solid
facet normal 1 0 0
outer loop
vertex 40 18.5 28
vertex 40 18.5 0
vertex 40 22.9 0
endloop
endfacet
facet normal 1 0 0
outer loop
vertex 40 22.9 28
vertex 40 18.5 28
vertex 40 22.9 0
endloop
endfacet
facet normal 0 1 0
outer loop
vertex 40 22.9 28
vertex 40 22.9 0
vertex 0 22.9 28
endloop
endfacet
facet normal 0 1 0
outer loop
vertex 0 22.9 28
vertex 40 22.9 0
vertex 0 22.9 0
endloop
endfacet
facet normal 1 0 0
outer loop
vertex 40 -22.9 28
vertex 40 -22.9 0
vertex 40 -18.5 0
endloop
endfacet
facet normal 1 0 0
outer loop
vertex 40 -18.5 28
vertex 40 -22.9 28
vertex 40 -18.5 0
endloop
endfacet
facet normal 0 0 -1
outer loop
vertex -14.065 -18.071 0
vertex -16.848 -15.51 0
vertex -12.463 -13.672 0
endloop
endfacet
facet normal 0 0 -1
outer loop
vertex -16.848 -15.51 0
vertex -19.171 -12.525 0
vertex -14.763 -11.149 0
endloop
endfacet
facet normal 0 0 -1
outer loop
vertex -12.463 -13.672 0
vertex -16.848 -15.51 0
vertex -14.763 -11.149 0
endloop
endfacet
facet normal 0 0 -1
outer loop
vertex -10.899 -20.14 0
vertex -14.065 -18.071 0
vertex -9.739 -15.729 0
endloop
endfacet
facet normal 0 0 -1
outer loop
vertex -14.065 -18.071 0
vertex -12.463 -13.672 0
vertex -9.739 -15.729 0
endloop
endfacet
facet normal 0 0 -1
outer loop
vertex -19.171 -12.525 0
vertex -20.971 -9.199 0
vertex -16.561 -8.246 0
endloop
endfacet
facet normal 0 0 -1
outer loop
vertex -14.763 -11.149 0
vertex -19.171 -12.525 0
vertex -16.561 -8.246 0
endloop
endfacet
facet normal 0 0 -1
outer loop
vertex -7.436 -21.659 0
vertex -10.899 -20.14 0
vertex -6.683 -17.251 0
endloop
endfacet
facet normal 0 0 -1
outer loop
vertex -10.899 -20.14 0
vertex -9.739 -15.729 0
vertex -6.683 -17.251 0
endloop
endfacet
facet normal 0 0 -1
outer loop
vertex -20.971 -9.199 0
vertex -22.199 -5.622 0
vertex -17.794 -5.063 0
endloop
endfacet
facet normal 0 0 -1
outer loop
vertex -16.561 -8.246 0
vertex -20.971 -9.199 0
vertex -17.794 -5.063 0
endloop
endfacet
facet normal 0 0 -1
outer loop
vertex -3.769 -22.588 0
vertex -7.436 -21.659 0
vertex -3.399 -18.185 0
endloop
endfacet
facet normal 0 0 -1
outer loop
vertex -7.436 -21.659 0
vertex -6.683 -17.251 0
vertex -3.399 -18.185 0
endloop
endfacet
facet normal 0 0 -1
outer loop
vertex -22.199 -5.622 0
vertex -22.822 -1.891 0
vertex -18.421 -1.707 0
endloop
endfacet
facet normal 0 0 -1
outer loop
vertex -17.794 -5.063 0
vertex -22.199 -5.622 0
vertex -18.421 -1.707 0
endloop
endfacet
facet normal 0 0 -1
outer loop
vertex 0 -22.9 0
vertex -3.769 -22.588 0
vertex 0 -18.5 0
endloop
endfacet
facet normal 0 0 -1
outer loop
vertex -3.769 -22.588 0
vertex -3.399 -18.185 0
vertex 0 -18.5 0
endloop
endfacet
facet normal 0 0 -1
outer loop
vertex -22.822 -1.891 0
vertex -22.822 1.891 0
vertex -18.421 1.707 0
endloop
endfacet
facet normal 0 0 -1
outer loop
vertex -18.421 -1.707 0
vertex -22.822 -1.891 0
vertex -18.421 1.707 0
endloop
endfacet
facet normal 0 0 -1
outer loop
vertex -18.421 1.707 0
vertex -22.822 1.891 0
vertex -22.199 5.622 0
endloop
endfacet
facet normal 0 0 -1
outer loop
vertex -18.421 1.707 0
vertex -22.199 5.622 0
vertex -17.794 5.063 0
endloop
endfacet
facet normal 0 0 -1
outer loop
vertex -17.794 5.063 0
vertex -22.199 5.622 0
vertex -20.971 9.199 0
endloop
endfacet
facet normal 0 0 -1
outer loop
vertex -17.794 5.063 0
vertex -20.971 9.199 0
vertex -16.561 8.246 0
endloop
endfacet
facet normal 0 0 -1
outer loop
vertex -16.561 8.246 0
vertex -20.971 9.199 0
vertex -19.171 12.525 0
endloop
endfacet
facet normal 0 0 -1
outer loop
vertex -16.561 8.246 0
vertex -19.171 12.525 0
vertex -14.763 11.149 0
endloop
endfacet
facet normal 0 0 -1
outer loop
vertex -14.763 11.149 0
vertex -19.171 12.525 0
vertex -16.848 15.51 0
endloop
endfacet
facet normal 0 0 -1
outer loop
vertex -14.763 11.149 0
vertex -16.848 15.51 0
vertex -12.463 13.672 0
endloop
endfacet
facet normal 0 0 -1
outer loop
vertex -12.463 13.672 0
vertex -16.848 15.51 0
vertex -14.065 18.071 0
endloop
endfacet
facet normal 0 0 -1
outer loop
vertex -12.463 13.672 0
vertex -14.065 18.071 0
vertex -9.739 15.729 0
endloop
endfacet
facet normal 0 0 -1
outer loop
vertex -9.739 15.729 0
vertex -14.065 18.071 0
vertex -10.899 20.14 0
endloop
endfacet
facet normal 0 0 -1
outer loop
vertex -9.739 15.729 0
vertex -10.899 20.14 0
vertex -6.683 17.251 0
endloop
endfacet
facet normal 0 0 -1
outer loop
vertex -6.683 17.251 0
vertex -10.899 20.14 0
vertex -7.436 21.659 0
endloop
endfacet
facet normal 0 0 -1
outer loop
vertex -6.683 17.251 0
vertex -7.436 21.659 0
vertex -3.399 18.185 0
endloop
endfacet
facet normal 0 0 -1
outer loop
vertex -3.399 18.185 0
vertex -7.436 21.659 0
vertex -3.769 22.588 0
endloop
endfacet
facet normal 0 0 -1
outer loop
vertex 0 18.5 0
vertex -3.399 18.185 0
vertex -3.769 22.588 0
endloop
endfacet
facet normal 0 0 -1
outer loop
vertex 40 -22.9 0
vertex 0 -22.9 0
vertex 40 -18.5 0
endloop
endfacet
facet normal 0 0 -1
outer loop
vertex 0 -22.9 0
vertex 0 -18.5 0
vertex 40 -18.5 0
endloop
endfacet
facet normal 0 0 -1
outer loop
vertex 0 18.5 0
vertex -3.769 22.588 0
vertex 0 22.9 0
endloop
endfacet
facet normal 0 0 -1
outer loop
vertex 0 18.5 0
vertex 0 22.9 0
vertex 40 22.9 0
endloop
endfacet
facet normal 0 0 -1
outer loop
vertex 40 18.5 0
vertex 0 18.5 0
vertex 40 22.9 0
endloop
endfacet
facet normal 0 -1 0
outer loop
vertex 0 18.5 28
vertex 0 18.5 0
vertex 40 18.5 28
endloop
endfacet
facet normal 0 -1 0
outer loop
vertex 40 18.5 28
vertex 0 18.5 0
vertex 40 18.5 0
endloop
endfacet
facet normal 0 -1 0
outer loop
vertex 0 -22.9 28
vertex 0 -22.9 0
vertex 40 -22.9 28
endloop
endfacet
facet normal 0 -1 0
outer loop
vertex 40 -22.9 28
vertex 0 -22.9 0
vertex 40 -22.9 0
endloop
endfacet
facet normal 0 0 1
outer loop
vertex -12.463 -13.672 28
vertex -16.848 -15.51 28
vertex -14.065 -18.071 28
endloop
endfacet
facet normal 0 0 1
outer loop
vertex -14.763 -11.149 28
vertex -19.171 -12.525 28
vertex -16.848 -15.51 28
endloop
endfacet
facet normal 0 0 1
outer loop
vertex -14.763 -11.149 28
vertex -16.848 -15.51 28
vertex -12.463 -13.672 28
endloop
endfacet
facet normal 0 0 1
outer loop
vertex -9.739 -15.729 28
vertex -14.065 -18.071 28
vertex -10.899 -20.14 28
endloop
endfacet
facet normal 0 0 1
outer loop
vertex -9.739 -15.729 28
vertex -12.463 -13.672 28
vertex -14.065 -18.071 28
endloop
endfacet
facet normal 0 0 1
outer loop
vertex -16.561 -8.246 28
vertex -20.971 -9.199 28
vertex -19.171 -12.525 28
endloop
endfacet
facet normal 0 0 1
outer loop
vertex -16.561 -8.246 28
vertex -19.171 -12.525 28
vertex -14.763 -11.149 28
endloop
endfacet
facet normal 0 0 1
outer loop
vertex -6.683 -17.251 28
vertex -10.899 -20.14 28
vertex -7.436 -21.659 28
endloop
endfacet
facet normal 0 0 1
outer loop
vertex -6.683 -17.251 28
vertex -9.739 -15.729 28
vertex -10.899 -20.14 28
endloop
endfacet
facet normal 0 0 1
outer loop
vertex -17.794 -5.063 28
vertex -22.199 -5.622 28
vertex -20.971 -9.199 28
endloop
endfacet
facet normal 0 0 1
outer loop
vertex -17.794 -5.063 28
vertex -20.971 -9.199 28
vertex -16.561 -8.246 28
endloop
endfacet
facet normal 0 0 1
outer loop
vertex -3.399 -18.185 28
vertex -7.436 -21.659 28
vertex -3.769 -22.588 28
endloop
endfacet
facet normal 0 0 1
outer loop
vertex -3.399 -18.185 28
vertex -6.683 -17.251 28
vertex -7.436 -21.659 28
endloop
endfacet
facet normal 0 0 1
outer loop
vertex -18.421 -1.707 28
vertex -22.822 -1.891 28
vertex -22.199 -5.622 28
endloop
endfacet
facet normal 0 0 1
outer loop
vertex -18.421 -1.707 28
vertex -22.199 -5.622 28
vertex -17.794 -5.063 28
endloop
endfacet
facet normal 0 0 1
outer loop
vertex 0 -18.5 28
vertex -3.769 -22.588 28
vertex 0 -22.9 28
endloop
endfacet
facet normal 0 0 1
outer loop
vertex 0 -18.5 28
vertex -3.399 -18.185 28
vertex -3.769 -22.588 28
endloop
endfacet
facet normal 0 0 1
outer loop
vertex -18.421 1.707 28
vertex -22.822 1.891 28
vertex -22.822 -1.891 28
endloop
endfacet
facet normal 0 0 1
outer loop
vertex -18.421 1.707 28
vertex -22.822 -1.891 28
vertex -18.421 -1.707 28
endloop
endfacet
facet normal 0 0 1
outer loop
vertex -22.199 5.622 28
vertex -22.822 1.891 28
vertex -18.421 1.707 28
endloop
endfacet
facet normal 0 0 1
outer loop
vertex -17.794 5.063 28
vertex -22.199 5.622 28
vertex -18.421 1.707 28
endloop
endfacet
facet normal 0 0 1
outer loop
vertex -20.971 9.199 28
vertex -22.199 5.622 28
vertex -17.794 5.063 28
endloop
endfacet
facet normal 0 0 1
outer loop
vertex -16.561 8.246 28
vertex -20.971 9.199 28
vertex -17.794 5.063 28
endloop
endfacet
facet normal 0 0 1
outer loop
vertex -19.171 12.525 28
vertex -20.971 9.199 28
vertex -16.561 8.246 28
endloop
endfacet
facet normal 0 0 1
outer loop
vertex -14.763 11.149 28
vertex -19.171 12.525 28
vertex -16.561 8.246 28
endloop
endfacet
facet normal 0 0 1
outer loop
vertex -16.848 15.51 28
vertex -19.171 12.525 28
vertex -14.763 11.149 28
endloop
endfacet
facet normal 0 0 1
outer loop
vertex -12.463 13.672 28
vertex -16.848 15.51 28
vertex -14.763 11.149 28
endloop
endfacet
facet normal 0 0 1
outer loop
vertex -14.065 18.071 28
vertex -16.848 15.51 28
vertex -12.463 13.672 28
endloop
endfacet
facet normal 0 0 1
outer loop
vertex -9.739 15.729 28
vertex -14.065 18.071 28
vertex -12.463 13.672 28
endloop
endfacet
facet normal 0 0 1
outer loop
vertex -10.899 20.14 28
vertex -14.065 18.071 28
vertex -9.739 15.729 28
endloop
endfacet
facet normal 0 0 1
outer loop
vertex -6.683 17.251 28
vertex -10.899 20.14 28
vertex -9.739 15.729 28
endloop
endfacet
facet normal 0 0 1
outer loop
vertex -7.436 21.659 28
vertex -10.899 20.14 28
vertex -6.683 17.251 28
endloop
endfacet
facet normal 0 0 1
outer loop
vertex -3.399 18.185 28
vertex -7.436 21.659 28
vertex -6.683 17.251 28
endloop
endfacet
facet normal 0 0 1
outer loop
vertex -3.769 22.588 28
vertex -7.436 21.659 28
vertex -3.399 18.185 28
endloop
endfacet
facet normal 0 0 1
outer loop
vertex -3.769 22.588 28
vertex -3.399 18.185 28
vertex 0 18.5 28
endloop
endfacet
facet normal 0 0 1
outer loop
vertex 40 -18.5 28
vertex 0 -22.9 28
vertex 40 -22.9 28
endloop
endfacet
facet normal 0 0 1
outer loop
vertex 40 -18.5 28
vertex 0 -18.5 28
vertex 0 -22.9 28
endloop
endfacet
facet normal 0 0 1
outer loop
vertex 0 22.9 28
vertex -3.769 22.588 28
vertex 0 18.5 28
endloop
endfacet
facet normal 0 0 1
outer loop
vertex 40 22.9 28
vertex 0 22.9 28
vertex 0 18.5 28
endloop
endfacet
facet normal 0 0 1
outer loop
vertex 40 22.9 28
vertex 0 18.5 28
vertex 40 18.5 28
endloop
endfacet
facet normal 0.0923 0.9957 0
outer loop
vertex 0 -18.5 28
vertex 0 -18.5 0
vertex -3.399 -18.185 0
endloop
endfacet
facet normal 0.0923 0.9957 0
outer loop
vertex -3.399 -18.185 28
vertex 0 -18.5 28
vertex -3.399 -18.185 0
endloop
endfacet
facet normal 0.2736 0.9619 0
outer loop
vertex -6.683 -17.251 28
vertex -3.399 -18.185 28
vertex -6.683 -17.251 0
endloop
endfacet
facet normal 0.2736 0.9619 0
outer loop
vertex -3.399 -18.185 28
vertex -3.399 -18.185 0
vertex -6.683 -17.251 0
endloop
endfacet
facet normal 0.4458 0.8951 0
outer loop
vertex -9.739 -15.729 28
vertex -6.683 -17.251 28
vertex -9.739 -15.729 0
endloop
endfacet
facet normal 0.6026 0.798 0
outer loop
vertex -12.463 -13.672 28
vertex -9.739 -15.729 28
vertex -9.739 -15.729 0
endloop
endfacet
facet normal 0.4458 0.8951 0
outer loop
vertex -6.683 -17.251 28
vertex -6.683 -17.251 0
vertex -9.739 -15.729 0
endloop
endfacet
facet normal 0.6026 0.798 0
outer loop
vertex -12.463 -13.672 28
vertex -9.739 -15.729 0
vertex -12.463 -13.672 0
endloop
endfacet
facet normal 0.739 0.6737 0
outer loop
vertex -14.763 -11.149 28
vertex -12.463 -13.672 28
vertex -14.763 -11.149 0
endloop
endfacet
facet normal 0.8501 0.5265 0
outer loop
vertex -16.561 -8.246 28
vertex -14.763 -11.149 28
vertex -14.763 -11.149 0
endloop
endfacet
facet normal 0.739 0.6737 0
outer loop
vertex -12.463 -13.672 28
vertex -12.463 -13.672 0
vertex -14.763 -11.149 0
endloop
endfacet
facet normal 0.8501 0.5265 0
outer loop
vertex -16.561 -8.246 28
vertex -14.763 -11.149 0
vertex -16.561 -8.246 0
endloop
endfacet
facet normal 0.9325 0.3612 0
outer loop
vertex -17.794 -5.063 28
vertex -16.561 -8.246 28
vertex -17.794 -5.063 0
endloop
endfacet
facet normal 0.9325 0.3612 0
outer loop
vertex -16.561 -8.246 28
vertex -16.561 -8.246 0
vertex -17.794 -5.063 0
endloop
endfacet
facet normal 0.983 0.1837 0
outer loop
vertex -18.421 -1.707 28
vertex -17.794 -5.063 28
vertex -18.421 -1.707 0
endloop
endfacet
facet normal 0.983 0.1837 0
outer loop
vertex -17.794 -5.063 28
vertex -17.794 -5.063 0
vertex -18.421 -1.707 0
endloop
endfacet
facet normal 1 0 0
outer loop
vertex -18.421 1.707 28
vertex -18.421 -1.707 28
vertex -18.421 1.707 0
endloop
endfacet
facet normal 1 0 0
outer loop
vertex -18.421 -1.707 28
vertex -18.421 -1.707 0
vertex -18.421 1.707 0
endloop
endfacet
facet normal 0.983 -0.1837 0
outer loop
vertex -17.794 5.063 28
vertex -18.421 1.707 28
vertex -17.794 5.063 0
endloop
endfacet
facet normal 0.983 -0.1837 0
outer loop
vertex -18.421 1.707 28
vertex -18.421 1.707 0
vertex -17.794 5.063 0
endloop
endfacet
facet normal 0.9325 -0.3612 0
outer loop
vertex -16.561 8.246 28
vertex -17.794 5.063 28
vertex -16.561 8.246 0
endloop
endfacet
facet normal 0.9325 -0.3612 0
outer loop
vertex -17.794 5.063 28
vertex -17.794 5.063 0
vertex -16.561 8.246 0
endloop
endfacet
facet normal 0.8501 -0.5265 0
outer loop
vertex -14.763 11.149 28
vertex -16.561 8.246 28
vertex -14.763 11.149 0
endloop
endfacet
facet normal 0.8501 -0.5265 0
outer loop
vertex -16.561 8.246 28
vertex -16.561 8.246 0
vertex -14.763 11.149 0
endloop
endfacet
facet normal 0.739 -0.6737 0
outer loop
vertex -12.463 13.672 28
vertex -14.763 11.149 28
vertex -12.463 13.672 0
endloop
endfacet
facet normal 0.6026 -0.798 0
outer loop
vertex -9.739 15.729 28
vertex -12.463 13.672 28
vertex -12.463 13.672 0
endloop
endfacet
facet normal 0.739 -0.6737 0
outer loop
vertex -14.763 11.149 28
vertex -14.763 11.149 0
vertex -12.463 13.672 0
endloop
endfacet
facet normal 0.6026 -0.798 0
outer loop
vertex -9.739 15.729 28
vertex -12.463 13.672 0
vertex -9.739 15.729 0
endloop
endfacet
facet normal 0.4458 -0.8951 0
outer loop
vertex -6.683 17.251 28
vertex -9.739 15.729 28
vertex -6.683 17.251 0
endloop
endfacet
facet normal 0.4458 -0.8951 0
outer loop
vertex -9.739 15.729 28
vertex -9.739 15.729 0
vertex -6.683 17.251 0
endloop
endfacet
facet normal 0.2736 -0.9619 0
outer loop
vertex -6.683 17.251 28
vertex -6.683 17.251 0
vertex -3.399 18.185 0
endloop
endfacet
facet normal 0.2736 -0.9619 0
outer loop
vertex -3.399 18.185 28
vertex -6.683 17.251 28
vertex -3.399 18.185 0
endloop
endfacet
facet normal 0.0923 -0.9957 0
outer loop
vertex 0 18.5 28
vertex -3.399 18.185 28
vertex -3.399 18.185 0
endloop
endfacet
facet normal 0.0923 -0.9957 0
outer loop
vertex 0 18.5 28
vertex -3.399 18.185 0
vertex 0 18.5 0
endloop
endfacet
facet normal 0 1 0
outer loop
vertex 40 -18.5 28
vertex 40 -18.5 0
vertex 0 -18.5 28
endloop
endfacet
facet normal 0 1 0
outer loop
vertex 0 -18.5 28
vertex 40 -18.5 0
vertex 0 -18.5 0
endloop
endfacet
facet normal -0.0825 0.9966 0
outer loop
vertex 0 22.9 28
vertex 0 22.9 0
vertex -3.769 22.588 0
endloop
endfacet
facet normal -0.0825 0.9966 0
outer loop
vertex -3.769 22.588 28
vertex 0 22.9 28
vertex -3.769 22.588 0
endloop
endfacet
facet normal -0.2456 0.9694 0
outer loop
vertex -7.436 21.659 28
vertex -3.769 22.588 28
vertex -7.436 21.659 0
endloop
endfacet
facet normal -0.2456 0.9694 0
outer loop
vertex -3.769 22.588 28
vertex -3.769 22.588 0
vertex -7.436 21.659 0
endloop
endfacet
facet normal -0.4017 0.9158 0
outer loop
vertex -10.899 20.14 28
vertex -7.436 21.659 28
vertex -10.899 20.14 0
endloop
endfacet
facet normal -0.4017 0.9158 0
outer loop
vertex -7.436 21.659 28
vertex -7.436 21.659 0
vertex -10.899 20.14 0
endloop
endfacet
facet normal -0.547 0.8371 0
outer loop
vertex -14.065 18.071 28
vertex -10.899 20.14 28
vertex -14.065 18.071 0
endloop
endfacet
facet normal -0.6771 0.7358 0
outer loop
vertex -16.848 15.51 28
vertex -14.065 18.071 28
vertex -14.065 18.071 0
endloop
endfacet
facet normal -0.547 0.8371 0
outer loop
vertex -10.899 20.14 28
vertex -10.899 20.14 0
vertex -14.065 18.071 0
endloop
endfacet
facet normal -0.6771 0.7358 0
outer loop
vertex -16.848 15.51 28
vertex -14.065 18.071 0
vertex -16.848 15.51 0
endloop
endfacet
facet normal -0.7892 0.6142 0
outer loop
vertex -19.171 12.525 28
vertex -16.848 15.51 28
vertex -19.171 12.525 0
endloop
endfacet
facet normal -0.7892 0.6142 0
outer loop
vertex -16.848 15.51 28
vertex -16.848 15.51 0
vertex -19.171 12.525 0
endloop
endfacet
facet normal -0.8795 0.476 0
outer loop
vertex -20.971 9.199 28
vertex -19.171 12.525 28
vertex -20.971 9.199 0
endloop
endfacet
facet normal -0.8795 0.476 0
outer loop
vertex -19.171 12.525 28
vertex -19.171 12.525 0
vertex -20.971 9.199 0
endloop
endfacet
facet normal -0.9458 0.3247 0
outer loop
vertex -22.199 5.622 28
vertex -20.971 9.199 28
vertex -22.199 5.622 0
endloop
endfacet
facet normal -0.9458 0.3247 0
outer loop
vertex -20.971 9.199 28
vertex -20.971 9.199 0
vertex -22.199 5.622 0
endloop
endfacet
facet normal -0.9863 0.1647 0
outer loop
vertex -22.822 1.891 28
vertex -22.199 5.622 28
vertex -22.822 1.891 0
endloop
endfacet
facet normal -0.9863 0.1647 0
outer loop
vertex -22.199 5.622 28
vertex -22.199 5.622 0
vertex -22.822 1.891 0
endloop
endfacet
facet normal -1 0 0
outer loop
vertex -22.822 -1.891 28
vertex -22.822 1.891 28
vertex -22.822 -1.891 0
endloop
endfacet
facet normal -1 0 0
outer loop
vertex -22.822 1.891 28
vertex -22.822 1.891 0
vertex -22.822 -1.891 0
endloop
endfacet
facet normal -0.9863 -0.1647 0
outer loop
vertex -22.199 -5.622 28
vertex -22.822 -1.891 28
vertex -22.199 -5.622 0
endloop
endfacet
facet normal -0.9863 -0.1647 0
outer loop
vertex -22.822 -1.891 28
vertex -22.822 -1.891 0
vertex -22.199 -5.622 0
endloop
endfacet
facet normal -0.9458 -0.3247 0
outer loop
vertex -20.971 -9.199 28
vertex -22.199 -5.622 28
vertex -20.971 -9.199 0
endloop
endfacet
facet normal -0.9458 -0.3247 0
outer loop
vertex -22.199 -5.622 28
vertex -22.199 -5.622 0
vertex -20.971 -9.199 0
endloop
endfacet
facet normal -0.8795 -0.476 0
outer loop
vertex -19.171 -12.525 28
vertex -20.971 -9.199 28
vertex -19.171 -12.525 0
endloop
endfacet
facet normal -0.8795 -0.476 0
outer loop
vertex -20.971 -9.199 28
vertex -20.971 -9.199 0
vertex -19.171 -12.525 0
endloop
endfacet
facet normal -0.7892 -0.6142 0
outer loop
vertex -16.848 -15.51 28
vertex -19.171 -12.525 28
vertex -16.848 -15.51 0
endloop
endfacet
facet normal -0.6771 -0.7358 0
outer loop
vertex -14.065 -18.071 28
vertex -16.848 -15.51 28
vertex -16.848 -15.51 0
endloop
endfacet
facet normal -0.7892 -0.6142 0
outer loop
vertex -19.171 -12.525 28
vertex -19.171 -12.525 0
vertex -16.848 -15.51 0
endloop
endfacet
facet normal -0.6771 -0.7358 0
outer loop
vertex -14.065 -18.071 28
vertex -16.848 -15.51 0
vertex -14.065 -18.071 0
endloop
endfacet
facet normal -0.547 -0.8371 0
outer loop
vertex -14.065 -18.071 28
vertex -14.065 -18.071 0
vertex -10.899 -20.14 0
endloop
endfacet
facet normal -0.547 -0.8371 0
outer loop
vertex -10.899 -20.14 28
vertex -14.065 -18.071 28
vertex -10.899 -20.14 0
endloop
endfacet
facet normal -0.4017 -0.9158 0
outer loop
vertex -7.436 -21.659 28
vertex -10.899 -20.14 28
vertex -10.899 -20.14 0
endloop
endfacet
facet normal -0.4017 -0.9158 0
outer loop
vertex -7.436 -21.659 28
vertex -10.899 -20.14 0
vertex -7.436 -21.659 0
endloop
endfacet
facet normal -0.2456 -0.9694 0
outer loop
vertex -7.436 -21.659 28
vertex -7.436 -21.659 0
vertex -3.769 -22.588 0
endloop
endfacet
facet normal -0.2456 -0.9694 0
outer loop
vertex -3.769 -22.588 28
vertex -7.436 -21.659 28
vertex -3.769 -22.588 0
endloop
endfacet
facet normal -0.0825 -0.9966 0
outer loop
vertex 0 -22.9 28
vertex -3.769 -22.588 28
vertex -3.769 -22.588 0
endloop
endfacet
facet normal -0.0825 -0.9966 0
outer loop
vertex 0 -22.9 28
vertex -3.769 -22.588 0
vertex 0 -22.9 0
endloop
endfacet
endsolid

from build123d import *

# Parameters (mm, degrees)
BOSS_EXTRUDE1_DEPTH = 28


with BuildPart() as part:
    # Sketch1 → Boss-Extrude1 (new body)
    with BuildSketch(Plane.XY):
        with BuildLine():
            ThreePointArc((0, 22.9), (7.09788701, 21.772230019), (13.496666255, 18.5))
            Line((13.496666255, 18.5), (40, 18.5))
            Line((40, 18.5), (40, 22.9))
            Line((40, 22.9), (0, 22.9))
        make_face()
        with BuildLine():
            ThreePointArc((0, -18.5), (-18.5, 0), (0, 18.5))
            Line((0, 18.5), (13.496666255, 18.5))
            ThreePointArc((13.496666255, 18.5), (7.09788701, 21.772230019), (0, 22.9))
            ThreePointArc((0, 22.9), (-22.9, 0), (0, -22.9))
            ThreePointArc((0, -22.9), (7.09788701, -21.772230019), (13.496666255, -18.5))
            Line((13.496666255, -18.5), (0, -18.5))
        make_face()
        with BuildLine():
            Line((40, -18.5), (13.496666255, -18.5))
            ThreePointArc((13.496666255, -18.5), (7.09788701, -21.772230019), (0, -22.9))
            Line((0, -22.9), (40, -22.9))
            Line((40, -22.9), (40, -18.5))
        make_face()
    extrude(amount=BOSS_EXTRUDE1_DEPTH)


solid = part.part
